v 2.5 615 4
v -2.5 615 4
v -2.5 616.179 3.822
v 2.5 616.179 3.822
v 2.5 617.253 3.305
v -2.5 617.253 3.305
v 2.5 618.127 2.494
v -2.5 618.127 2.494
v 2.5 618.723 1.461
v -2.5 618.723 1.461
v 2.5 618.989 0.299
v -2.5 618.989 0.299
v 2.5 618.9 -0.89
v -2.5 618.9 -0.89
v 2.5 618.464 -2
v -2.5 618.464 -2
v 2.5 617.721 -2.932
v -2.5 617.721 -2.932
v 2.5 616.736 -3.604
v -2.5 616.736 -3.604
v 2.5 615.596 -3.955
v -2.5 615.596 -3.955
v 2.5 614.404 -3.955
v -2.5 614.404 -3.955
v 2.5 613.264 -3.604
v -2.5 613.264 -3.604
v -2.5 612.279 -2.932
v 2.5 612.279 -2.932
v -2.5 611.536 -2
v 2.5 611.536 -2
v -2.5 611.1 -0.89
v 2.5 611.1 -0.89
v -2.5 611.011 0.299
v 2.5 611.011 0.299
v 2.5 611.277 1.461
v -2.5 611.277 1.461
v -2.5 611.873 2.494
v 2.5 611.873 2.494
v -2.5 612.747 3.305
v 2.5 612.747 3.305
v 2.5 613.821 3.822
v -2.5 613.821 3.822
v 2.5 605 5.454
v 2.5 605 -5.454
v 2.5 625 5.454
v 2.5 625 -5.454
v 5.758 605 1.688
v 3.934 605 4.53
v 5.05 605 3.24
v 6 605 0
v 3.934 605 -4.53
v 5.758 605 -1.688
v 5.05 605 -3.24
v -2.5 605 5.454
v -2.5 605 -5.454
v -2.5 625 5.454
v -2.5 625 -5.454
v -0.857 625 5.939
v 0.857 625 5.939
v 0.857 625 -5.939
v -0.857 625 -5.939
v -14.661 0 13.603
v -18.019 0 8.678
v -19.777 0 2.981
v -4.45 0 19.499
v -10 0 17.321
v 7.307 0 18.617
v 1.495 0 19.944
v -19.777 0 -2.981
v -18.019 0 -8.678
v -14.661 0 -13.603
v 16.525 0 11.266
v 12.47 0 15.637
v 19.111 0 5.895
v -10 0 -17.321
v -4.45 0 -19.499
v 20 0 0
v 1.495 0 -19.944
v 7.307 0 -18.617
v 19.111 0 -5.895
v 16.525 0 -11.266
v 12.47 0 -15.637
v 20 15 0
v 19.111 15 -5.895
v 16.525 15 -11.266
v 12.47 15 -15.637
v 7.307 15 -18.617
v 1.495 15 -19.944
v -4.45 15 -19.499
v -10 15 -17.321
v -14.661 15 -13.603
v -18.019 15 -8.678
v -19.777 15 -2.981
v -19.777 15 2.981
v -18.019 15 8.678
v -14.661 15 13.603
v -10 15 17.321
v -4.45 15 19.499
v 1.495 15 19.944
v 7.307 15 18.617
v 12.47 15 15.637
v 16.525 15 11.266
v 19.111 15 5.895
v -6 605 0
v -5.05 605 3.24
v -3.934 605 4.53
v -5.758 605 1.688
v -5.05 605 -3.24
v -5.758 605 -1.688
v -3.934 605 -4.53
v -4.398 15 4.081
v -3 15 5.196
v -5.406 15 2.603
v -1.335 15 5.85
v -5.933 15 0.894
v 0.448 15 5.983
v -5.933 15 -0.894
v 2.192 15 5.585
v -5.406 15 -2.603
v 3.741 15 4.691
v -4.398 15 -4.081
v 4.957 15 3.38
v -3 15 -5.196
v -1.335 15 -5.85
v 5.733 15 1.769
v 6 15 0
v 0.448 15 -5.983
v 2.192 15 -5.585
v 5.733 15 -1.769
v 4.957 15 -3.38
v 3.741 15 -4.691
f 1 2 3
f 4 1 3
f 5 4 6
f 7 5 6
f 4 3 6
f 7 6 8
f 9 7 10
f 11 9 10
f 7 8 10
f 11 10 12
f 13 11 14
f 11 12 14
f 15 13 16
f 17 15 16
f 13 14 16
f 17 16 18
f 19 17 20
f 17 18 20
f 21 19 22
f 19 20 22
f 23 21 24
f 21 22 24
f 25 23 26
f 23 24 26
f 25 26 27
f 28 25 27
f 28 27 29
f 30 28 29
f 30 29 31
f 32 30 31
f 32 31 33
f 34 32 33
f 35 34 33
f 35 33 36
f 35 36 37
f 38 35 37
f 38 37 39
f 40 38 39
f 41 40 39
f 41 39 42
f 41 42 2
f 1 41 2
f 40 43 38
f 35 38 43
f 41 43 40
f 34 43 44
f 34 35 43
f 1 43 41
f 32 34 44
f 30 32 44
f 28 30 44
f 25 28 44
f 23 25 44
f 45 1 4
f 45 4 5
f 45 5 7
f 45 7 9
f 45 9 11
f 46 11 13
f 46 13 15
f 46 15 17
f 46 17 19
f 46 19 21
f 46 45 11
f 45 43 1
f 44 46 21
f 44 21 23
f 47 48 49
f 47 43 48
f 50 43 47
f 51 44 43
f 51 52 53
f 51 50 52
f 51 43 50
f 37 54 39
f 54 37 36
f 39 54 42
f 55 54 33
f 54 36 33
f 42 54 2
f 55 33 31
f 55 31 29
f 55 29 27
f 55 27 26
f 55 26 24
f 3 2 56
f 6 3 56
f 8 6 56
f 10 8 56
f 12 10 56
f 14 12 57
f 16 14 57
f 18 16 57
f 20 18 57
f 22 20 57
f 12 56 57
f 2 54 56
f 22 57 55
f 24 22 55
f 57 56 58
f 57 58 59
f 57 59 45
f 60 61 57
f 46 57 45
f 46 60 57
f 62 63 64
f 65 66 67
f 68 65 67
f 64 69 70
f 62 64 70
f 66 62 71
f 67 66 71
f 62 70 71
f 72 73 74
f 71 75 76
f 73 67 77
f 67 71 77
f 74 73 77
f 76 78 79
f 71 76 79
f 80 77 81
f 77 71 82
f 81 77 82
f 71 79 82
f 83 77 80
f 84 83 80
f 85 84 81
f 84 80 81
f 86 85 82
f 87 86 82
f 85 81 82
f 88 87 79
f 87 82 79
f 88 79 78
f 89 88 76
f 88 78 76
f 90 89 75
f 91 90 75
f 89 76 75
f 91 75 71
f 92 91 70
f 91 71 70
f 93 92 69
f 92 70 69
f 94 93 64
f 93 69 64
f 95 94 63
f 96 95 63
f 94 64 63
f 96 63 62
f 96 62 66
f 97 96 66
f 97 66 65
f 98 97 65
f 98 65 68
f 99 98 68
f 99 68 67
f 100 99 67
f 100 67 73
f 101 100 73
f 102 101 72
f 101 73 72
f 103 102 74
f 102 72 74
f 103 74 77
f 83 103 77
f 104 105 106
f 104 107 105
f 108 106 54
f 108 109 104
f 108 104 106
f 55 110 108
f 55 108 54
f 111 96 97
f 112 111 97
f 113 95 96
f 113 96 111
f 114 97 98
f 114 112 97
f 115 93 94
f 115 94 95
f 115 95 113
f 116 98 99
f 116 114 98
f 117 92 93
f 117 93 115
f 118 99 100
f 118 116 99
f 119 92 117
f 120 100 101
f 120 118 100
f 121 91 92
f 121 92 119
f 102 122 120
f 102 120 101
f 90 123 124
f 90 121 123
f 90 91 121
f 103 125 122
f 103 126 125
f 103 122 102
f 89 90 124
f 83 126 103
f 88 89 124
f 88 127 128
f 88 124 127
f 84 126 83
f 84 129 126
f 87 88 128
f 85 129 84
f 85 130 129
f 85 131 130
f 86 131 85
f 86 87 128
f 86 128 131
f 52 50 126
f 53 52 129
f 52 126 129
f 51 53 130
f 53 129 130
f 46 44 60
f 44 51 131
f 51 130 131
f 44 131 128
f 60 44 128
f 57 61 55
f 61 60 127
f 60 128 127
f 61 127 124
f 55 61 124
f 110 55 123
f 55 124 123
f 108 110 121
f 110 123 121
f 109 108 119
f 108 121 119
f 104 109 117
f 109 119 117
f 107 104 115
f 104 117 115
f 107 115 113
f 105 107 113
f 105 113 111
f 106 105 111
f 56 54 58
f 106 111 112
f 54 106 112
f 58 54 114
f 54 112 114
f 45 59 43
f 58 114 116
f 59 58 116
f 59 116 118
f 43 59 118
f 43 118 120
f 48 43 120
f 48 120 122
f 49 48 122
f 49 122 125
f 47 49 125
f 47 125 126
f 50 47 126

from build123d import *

# Parameters (mm, degrees)
SKETCH_1_R           = 20
EXTRUDE_1_DEPTH      = 15
SKETCH_2_R           = 6
EXTRUDE_2_DEPTH      = 610
SKETCH_3_OUTSIDE_W   = 167.51
SKETCH_3_OUTSIDE_H   = 167.51
SKETCH_3_OUTSIDE_W_2 = 5
SKETCH_3_OUTSIDE_H_2 = 20
CUT_EXTRUDE_1_DEPTH  = 20
SKETCH_4_R           = 4
CUT_EXTRUDE_2_DEPTH  = 20


with BuildPart() as part:
    # 草图1 → 凸台-拉伸1 (new body)
    with BuildSketch(Plane(origin=(0, 0, 0), x_dir=(1, 0, 0), z_dir=(0, 1, 0))):
        Circle(SKETCH_1_R)
    extrude(amount=EXTRUDE_1_DEPTH)

    # 草图2 → 凸台-拉伸2 (add)
    with BuildSketch(Plane(origin=(0, 15, 0), x_dir=(1, 0, 0), z_dir=(0, 1, 0))):
        Circle(SKETCH_2_R)
    extrude(amount=EXTRUDE_2_DEPTH)

    # 草图3 outside → 切除-拉伸1 (cut)
    with BuildSketch(Plane(origin=(0, 625, 0), x_dir=(1, 0, 0), z_dir=(0, 1, 0))):
        Rectangle(SKETCH_3_OUTSIDE_W, SKETCH_3_OUTSIDE_H)
        Rectangle(SKETCH_3_OUTSIDE_W_2, SKETCH_3_OUTSIDE_H_2, mode=Mode.SUBTRACT)
    extrude(amount=-CUT_EXTRUDE_1_DEPTH, mode=Mode.SUBTRACT)

    # 草图4 → 切除-拉伸2 (cut)
    with BuildSketch(Plane.ZY.offset(2.5)):
        with Locations((0, 615)):
            Circle(SKETCH_4_R)
    extrude(amount=-CUT_EXTRUDE_2_DEPTH, mode=Mode.SUBTRACT)


solid = part.part
